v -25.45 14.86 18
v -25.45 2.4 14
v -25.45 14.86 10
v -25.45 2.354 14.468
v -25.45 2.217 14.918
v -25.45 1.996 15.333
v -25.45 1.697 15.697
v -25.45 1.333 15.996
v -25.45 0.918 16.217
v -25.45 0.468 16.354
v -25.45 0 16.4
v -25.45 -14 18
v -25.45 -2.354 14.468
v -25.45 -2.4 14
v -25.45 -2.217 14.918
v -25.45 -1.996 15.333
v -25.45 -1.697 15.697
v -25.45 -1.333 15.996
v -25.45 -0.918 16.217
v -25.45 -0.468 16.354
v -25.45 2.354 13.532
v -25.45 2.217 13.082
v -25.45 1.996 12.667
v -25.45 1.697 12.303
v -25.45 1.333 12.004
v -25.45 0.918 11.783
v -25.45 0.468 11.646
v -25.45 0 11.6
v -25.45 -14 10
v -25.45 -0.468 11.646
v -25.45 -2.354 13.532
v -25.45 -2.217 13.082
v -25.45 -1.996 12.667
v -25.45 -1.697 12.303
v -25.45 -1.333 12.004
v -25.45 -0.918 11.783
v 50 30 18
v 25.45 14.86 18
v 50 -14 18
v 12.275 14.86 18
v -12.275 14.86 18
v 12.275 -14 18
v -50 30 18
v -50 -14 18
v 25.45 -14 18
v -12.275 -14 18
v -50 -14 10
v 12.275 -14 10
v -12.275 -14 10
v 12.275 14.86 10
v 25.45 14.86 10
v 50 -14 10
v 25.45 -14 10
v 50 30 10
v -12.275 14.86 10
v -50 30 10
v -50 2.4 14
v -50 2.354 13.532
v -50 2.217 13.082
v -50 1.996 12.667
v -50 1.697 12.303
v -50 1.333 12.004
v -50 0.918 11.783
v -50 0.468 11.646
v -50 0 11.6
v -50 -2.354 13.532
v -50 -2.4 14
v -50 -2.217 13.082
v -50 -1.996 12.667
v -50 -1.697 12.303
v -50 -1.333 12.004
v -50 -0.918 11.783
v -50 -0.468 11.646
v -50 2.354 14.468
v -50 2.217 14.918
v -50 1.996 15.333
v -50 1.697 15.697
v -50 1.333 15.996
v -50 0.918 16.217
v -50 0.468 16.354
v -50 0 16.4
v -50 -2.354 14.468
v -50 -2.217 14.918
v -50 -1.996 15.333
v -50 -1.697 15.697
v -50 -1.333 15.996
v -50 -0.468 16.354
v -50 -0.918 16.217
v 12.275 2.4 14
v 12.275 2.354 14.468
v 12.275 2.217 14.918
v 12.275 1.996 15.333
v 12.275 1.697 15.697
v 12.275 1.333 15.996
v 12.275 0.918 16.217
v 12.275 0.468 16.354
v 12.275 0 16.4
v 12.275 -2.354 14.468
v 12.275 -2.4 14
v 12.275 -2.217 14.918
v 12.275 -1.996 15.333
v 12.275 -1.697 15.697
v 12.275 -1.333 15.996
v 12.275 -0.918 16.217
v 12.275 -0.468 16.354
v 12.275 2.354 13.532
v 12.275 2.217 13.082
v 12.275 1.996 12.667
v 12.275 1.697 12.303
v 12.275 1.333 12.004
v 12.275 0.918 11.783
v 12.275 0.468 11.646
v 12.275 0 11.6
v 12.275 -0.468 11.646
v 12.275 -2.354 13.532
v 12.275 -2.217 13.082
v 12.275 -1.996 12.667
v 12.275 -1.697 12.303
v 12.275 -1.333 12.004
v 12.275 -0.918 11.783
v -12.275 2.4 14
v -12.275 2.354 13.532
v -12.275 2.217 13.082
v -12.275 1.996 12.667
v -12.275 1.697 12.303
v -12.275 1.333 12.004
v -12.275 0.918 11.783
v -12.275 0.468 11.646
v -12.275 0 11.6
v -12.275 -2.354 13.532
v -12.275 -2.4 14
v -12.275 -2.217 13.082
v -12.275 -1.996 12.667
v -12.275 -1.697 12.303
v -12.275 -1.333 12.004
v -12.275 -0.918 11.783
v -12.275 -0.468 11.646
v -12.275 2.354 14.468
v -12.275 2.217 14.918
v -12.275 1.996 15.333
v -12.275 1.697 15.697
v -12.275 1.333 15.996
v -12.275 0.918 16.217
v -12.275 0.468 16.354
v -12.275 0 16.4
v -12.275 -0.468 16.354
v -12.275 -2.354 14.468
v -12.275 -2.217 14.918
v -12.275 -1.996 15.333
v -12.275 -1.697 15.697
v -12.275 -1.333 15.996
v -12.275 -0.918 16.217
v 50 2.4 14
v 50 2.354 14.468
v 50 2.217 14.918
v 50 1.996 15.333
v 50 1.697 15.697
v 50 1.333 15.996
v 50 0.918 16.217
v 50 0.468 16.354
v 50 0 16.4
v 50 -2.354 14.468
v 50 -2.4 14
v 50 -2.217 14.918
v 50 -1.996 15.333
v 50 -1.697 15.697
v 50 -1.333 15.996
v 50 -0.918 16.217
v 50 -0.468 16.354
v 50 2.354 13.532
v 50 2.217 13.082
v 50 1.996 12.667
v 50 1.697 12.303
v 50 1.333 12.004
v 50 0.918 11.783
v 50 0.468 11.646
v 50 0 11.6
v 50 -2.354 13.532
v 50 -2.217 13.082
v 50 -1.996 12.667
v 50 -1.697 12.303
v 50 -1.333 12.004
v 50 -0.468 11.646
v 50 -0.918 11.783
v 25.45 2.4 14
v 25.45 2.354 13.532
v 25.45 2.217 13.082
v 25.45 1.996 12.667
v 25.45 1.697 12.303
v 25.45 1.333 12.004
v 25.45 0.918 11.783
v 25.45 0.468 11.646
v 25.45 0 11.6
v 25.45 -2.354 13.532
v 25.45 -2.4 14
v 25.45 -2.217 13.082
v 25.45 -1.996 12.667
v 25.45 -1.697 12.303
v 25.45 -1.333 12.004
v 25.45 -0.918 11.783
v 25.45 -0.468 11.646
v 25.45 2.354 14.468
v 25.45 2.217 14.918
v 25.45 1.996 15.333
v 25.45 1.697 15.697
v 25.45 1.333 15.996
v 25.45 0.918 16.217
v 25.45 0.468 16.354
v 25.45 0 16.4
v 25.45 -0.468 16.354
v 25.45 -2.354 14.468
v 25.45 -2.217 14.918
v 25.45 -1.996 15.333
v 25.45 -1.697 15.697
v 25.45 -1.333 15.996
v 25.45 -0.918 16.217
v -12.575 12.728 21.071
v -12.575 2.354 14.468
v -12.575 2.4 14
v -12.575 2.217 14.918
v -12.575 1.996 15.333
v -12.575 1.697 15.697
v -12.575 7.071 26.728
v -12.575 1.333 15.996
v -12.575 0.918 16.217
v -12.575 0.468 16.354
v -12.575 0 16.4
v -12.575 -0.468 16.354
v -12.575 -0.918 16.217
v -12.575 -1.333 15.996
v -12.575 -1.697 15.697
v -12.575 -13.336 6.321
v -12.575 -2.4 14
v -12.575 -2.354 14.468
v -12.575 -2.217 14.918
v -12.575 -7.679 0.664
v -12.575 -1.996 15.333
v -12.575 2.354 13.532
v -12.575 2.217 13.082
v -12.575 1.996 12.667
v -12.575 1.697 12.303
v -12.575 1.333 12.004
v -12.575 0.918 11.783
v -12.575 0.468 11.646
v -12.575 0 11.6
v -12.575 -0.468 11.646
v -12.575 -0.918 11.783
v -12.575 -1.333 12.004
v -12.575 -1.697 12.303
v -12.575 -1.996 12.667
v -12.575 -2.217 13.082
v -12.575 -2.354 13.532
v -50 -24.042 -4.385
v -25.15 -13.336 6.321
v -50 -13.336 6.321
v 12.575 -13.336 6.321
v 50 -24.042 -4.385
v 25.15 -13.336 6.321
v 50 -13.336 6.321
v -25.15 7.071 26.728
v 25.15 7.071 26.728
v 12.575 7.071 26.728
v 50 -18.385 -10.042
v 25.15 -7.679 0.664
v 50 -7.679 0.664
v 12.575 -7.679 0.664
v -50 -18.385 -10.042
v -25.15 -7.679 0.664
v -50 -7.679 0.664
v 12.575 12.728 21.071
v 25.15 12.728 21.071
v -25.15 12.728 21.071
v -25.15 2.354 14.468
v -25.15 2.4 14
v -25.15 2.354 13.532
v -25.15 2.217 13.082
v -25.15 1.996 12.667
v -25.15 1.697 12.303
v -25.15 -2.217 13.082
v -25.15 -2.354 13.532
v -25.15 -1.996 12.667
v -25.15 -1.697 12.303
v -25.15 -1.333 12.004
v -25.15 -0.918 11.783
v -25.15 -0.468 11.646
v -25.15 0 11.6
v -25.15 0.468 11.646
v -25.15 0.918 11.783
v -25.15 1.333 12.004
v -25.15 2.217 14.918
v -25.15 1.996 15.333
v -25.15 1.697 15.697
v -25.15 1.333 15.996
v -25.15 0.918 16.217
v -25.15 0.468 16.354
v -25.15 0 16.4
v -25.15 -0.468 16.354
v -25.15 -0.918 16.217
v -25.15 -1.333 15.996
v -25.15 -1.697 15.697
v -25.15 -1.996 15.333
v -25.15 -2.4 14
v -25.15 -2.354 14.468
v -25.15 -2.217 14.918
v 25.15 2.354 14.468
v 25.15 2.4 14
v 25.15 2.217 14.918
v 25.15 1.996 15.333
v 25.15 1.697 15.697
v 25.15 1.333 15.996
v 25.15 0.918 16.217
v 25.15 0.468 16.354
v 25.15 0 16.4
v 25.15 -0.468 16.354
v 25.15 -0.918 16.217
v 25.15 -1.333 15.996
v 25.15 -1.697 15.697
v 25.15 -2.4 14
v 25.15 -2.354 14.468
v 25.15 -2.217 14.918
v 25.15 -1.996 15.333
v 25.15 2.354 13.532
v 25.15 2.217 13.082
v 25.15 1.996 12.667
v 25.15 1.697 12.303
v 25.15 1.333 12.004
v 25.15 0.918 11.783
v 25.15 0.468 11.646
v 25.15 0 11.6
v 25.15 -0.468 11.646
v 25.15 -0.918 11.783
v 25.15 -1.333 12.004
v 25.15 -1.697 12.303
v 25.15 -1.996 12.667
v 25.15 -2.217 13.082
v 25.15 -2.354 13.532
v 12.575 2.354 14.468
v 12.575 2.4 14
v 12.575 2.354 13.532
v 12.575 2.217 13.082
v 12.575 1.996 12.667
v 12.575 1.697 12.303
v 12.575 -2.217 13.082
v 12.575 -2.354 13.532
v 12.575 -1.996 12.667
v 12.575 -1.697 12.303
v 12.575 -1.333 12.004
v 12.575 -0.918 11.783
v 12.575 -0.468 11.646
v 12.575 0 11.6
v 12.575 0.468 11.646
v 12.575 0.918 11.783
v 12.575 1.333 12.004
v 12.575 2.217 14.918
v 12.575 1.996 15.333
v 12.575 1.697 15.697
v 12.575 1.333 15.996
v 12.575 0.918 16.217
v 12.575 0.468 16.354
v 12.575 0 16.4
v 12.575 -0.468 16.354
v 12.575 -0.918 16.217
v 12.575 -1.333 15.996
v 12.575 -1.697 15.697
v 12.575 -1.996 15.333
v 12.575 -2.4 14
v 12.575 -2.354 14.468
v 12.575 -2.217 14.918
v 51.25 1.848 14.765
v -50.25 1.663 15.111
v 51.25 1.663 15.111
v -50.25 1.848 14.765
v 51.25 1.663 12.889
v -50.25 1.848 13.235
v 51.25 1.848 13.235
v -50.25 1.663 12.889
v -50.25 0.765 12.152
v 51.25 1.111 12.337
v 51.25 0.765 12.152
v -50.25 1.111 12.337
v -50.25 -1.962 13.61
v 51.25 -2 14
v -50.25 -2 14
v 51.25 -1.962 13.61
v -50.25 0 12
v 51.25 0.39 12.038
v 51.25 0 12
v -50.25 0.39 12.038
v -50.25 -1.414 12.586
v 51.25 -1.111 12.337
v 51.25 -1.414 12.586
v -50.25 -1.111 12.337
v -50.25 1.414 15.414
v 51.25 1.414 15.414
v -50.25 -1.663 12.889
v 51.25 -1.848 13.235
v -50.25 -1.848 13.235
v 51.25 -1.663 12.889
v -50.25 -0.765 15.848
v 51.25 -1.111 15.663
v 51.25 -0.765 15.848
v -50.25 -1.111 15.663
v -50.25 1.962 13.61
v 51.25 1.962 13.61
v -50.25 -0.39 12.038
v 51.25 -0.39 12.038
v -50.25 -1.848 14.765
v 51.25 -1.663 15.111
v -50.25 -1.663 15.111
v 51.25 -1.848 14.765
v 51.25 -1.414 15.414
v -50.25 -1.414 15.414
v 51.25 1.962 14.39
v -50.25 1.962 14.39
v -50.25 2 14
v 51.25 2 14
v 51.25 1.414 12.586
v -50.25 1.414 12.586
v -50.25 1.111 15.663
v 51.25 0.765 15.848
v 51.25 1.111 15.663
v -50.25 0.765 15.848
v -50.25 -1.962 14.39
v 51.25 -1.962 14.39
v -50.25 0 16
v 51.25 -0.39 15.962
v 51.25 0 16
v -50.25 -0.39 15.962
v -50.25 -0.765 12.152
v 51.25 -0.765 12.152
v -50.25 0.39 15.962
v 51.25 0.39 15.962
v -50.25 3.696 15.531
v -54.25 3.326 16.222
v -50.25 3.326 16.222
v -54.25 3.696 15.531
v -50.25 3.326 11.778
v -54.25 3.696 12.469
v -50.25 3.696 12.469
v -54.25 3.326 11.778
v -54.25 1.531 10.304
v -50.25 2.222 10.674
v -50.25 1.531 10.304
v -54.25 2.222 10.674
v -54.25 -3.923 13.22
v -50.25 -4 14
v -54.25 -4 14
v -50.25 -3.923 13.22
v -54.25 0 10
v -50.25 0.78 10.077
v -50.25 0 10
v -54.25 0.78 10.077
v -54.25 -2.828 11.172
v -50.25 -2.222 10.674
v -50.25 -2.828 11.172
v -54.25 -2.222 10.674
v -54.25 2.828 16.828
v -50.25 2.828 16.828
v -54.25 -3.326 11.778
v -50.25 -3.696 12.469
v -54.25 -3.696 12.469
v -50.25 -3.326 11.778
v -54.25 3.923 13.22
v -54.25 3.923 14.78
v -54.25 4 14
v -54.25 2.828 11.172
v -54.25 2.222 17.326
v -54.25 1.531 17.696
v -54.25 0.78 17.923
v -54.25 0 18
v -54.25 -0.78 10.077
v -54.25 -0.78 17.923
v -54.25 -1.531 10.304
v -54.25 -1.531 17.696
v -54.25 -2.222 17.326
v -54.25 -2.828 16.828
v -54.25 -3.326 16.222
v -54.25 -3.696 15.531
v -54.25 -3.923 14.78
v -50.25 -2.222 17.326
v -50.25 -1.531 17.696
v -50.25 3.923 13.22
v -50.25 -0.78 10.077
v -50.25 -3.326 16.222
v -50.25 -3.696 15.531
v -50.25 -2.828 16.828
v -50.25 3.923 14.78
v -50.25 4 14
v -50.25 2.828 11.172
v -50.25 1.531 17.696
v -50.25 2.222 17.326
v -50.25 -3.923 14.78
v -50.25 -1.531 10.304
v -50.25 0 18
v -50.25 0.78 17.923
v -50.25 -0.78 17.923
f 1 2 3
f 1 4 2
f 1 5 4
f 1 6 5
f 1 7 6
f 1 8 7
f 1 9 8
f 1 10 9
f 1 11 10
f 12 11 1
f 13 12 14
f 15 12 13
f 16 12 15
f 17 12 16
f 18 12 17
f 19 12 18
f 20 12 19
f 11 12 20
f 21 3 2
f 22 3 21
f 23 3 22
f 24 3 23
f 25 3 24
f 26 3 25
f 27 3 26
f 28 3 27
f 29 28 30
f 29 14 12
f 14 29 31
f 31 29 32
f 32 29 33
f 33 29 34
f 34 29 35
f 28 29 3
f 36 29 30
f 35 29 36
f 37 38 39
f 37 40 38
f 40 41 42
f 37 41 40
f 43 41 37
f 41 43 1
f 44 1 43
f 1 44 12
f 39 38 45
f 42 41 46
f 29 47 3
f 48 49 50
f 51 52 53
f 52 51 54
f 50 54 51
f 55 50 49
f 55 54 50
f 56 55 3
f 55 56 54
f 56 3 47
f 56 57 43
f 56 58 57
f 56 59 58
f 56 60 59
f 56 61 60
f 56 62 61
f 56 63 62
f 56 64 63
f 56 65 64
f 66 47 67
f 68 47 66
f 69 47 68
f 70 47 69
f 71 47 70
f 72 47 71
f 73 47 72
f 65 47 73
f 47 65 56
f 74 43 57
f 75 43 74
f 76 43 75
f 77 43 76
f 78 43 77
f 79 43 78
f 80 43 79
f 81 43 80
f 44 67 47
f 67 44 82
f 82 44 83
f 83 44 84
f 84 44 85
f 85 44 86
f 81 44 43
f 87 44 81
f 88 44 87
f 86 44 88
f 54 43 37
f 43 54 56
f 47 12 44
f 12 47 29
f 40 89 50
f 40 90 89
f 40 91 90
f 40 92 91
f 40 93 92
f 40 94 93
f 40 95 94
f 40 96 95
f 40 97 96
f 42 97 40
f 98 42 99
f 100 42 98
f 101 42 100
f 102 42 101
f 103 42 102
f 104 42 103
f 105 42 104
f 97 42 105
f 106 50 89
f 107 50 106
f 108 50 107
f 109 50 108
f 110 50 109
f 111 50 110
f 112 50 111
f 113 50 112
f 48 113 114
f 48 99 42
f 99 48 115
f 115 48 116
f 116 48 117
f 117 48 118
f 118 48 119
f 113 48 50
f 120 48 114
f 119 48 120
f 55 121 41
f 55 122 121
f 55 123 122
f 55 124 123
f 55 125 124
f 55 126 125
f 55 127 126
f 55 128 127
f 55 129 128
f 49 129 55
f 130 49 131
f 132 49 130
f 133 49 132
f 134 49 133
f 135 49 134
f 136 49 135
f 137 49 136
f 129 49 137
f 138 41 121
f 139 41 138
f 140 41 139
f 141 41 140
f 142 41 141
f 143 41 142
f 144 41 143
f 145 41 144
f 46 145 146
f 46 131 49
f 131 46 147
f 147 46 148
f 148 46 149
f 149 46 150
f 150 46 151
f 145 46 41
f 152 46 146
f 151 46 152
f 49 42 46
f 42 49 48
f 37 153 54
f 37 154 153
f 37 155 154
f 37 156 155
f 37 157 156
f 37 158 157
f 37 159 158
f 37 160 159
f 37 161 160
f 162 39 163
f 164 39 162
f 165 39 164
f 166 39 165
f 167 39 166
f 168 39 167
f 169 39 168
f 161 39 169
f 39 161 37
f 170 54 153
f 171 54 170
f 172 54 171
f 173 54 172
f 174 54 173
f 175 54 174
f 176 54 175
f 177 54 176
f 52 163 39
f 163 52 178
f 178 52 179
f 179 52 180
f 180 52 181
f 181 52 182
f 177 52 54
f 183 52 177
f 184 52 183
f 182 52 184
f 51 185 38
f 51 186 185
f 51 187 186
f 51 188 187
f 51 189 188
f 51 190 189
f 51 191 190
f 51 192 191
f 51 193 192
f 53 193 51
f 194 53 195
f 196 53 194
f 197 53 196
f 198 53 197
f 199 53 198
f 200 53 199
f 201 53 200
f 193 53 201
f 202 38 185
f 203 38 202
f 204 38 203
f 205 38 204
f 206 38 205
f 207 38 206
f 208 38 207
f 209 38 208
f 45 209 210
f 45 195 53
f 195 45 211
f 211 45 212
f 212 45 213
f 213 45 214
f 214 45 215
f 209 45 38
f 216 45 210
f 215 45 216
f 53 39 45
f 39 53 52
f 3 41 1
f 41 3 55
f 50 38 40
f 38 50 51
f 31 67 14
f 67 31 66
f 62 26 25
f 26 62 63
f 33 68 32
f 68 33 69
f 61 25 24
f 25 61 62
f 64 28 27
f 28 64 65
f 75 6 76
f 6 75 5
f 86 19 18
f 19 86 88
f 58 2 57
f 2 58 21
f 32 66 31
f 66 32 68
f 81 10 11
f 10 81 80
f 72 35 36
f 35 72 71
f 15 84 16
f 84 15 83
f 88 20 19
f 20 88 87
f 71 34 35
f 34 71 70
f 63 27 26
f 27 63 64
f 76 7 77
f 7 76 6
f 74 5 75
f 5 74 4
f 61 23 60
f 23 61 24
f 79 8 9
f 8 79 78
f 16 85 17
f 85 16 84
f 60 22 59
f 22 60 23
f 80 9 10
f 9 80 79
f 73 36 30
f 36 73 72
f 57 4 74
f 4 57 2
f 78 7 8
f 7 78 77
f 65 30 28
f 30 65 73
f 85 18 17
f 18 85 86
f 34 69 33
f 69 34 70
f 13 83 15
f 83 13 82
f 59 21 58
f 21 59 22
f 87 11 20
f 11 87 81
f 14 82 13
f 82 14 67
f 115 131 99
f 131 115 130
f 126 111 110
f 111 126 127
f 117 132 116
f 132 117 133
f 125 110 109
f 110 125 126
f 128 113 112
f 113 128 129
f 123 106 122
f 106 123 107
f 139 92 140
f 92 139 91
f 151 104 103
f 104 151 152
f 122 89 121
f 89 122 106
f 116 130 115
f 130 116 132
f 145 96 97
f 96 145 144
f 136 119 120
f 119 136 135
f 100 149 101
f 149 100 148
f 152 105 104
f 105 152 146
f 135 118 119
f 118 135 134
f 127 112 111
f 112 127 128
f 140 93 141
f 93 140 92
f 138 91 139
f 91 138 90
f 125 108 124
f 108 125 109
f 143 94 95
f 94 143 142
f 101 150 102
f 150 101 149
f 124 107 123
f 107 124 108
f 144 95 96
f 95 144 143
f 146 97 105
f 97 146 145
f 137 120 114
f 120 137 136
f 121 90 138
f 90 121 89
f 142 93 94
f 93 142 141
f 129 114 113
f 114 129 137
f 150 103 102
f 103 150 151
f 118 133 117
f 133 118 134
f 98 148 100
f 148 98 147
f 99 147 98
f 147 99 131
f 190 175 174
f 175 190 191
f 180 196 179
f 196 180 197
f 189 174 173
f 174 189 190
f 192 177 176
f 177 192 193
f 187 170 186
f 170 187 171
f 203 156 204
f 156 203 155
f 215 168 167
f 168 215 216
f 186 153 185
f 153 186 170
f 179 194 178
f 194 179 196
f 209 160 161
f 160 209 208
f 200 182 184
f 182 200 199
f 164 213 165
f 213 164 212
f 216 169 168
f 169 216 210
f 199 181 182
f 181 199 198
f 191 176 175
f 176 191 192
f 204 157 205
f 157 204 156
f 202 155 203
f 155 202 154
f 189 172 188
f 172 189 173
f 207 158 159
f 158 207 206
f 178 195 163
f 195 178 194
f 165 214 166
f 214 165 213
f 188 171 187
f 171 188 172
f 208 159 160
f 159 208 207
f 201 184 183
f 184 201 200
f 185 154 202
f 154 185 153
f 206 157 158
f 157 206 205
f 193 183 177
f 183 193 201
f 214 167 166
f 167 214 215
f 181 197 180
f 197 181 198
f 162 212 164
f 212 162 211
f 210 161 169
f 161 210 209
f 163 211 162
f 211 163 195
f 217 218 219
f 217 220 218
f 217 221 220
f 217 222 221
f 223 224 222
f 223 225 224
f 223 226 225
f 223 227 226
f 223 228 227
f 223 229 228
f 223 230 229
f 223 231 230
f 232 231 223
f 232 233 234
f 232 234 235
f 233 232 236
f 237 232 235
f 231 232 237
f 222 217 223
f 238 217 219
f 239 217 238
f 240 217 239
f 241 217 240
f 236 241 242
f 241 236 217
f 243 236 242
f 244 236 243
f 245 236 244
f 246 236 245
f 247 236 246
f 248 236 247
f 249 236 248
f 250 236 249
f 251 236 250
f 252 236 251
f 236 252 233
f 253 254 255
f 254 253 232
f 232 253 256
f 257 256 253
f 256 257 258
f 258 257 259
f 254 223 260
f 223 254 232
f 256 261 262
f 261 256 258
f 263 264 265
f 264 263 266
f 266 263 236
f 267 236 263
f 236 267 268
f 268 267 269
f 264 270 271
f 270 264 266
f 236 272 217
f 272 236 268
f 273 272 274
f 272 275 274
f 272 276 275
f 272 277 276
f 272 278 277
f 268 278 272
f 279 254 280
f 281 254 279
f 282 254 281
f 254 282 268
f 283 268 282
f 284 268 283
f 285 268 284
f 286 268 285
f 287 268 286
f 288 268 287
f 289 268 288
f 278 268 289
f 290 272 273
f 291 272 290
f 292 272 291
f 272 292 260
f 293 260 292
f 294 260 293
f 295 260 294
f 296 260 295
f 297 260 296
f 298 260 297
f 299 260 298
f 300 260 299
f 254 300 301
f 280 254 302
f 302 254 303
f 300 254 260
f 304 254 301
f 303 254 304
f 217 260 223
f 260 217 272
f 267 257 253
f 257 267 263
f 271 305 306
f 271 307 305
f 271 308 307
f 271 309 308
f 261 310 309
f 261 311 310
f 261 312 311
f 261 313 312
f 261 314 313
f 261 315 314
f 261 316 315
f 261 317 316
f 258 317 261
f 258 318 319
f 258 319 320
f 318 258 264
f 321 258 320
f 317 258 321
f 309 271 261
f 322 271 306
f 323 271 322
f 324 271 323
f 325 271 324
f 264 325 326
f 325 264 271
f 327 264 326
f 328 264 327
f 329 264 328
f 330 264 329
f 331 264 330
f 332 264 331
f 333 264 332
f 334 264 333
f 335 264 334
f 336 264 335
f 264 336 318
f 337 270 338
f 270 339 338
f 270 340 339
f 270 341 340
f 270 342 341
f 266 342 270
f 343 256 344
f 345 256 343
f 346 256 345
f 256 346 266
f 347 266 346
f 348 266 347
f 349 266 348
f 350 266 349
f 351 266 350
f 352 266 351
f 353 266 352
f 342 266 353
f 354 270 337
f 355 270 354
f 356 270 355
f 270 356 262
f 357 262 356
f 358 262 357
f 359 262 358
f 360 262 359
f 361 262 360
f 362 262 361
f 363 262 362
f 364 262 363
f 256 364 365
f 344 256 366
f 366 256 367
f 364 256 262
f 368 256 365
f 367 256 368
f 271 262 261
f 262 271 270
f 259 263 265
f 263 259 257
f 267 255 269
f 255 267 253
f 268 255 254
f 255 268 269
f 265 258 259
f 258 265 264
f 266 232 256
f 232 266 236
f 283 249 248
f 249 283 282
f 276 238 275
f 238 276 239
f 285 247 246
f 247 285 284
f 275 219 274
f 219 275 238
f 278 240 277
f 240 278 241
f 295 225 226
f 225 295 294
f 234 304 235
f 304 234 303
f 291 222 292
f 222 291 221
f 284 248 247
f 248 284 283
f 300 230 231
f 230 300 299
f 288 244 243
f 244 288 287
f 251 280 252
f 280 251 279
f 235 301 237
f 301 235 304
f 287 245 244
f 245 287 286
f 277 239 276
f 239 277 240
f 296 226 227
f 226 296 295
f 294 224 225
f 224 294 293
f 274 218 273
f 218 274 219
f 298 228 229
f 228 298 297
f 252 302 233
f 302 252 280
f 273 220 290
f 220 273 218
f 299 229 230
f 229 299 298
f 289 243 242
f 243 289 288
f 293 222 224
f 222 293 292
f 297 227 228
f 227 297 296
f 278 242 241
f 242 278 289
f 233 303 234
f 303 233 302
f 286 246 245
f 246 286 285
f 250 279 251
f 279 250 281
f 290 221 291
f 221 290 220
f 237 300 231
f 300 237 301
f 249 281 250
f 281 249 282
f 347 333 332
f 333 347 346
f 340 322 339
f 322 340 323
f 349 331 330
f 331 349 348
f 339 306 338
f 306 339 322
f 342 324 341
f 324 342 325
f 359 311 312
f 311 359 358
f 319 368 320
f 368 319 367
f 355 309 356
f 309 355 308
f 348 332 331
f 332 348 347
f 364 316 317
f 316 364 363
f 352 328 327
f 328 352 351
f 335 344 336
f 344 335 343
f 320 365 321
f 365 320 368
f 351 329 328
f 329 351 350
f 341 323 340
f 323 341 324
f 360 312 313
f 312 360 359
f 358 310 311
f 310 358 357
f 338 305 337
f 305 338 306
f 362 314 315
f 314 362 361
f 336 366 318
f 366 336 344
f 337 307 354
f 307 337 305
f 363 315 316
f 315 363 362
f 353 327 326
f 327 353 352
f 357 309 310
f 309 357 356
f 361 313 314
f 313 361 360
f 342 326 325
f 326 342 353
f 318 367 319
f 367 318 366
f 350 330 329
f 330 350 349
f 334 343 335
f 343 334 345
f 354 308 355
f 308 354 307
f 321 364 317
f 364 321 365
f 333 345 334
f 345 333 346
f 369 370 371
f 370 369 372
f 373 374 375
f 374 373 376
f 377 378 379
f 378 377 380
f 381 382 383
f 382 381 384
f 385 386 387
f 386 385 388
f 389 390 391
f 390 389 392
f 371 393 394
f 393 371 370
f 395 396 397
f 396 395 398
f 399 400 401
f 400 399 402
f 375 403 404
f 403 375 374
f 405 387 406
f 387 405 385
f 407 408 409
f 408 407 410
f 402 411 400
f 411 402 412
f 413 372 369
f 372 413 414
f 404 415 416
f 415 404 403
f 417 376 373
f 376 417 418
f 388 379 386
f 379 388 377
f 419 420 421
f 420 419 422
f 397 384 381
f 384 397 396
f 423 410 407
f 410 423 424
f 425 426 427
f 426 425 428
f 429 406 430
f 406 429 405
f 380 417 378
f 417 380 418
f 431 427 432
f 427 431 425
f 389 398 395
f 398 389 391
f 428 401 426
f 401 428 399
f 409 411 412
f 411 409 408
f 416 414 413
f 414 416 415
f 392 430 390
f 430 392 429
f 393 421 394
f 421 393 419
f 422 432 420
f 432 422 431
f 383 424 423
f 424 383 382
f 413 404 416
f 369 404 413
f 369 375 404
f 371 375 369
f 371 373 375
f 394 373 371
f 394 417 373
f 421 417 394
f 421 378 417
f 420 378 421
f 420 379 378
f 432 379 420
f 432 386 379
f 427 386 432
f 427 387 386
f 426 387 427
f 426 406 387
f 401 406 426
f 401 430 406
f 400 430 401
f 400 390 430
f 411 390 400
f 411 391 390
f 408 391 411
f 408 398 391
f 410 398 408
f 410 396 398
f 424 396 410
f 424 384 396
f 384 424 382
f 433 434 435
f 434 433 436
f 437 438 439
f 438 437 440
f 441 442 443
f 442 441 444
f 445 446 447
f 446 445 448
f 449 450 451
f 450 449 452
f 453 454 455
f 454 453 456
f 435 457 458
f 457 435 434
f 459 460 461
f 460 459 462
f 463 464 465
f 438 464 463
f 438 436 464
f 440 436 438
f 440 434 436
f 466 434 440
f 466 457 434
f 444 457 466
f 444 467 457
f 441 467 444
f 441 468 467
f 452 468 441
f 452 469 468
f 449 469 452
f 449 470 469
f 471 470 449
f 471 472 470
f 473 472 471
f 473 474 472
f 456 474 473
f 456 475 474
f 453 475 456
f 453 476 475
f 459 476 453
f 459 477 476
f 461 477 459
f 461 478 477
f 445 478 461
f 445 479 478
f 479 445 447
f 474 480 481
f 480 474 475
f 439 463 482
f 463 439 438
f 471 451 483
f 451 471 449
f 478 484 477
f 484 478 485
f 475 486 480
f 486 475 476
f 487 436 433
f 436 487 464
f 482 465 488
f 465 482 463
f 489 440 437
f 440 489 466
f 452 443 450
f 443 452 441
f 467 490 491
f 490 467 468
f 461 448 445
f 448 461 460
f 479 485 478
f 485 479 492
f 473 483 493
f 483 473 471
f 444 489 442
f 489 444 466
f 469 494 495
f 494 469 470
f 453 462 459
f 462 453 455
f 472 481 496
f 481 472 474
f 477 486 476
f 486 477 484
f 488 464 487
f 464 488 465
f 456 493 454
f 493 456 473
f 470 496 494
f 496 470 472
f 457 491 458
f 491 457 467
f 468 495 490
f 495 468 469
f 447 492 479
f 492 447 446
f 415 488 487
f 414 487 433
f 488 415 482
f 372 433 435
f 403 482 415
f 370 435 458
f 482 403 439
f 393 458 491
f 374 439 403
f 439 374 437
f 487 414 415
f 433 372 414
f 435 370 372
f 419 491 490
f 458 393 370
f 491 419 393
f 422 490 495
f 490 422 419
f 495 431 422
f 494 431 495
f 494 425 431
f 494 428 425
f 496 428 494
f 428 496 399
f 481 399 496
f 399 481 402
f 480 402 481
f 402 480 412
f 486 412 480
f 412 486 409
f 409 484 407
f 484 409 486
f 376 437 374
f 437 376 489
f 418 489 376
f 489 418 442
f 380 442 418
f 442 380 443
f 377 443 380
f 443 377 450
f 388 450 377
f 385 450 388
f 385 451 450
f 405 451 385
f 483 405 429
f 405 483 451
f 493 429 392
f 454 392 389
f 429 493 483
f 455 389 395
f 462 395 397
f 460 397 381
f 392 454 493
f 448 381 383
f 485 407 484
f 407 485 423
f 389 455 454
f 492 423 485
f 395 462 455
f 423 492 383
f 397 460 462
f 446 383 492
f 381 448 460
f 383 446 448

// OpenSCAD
$fn = 32;

// ------------------------------------------------------------------------
// Butt hinge: hinge 100 mm, leaf swung 45 deg
// Every part is its own module, assembly() places every instance.
// ------------------------------------------------------------------------

// --- part 1 ---
module hinge_base() {
  difference() {
    union() {
      translate([-50, -14, -4]) cube([24.55, 44, 8]);
      translate([-12.275, -14, -4]) cube([24.55, 44, 8]);
      translate([25.45, -14, -4]) cube([24.55, 44, 8]);
      translate([-50, 14.86, -4]) cube([100, 15.14, 8]);
    }
    translate([-37.725, 0, 0]) rotate([0, 90, 0]) cylinder(h = 26.55, d = 4.8, center = true);
    translate([0, 0, 0]) rotate([0, 90, 0]) cylinder(h = 26.55, d = 4.8, center = true);
    translate([37.725, 0, 0]) rotate([0, 90, 0]) cylinder(h = 26.55, d = 4.8, center = true);
  }
}

// --- part 2 ---
module hinge_mover() {
  difference() {
    union() {
      translate([-25.15, -30, -4]) cube([12.575, 44, 8]);
      translate([12.575, -30, -4]) cube([12.575, 44, 8]);
      translate([-50, -30, -4]) cube([100, 15.14, 8]);
    }
    translate([-18.863, 0, 0]) rotate([0, 90, 0]) cylinder(h = 14.575, d = 4.8, center = true);
    translate([18.863, 0, 0]) rotate([0, 90, 0]) cylinder(h = 14.575, d = 4.8, center = true);
  }
}

// --- part 3 ---
module hinge_pin() {
  rotate([0, 90, 0]) cylinder(h = 102.5, d = 4, center = true);
  translate([-54.25, 0, 0]) rotate([0, 90, 0]) cylinder(h = 4, d = 8);
}

// --- assembly ---
module assembly() {
  color([0.80, 0.24, 0.20]) translate([0, 0, 14]) rotate([0, 0, 0]) hinge_base();
  color([0.20, 0.45, 0.75]) translate([0, 0, 14]) rotate([45, 0, 0]) hinge_mover();
  color([0.25, 0.62, 0.32]) translate([0, 0, 14]) rotate([0, 0, 0]) hinge_pin();
}

assembly();
